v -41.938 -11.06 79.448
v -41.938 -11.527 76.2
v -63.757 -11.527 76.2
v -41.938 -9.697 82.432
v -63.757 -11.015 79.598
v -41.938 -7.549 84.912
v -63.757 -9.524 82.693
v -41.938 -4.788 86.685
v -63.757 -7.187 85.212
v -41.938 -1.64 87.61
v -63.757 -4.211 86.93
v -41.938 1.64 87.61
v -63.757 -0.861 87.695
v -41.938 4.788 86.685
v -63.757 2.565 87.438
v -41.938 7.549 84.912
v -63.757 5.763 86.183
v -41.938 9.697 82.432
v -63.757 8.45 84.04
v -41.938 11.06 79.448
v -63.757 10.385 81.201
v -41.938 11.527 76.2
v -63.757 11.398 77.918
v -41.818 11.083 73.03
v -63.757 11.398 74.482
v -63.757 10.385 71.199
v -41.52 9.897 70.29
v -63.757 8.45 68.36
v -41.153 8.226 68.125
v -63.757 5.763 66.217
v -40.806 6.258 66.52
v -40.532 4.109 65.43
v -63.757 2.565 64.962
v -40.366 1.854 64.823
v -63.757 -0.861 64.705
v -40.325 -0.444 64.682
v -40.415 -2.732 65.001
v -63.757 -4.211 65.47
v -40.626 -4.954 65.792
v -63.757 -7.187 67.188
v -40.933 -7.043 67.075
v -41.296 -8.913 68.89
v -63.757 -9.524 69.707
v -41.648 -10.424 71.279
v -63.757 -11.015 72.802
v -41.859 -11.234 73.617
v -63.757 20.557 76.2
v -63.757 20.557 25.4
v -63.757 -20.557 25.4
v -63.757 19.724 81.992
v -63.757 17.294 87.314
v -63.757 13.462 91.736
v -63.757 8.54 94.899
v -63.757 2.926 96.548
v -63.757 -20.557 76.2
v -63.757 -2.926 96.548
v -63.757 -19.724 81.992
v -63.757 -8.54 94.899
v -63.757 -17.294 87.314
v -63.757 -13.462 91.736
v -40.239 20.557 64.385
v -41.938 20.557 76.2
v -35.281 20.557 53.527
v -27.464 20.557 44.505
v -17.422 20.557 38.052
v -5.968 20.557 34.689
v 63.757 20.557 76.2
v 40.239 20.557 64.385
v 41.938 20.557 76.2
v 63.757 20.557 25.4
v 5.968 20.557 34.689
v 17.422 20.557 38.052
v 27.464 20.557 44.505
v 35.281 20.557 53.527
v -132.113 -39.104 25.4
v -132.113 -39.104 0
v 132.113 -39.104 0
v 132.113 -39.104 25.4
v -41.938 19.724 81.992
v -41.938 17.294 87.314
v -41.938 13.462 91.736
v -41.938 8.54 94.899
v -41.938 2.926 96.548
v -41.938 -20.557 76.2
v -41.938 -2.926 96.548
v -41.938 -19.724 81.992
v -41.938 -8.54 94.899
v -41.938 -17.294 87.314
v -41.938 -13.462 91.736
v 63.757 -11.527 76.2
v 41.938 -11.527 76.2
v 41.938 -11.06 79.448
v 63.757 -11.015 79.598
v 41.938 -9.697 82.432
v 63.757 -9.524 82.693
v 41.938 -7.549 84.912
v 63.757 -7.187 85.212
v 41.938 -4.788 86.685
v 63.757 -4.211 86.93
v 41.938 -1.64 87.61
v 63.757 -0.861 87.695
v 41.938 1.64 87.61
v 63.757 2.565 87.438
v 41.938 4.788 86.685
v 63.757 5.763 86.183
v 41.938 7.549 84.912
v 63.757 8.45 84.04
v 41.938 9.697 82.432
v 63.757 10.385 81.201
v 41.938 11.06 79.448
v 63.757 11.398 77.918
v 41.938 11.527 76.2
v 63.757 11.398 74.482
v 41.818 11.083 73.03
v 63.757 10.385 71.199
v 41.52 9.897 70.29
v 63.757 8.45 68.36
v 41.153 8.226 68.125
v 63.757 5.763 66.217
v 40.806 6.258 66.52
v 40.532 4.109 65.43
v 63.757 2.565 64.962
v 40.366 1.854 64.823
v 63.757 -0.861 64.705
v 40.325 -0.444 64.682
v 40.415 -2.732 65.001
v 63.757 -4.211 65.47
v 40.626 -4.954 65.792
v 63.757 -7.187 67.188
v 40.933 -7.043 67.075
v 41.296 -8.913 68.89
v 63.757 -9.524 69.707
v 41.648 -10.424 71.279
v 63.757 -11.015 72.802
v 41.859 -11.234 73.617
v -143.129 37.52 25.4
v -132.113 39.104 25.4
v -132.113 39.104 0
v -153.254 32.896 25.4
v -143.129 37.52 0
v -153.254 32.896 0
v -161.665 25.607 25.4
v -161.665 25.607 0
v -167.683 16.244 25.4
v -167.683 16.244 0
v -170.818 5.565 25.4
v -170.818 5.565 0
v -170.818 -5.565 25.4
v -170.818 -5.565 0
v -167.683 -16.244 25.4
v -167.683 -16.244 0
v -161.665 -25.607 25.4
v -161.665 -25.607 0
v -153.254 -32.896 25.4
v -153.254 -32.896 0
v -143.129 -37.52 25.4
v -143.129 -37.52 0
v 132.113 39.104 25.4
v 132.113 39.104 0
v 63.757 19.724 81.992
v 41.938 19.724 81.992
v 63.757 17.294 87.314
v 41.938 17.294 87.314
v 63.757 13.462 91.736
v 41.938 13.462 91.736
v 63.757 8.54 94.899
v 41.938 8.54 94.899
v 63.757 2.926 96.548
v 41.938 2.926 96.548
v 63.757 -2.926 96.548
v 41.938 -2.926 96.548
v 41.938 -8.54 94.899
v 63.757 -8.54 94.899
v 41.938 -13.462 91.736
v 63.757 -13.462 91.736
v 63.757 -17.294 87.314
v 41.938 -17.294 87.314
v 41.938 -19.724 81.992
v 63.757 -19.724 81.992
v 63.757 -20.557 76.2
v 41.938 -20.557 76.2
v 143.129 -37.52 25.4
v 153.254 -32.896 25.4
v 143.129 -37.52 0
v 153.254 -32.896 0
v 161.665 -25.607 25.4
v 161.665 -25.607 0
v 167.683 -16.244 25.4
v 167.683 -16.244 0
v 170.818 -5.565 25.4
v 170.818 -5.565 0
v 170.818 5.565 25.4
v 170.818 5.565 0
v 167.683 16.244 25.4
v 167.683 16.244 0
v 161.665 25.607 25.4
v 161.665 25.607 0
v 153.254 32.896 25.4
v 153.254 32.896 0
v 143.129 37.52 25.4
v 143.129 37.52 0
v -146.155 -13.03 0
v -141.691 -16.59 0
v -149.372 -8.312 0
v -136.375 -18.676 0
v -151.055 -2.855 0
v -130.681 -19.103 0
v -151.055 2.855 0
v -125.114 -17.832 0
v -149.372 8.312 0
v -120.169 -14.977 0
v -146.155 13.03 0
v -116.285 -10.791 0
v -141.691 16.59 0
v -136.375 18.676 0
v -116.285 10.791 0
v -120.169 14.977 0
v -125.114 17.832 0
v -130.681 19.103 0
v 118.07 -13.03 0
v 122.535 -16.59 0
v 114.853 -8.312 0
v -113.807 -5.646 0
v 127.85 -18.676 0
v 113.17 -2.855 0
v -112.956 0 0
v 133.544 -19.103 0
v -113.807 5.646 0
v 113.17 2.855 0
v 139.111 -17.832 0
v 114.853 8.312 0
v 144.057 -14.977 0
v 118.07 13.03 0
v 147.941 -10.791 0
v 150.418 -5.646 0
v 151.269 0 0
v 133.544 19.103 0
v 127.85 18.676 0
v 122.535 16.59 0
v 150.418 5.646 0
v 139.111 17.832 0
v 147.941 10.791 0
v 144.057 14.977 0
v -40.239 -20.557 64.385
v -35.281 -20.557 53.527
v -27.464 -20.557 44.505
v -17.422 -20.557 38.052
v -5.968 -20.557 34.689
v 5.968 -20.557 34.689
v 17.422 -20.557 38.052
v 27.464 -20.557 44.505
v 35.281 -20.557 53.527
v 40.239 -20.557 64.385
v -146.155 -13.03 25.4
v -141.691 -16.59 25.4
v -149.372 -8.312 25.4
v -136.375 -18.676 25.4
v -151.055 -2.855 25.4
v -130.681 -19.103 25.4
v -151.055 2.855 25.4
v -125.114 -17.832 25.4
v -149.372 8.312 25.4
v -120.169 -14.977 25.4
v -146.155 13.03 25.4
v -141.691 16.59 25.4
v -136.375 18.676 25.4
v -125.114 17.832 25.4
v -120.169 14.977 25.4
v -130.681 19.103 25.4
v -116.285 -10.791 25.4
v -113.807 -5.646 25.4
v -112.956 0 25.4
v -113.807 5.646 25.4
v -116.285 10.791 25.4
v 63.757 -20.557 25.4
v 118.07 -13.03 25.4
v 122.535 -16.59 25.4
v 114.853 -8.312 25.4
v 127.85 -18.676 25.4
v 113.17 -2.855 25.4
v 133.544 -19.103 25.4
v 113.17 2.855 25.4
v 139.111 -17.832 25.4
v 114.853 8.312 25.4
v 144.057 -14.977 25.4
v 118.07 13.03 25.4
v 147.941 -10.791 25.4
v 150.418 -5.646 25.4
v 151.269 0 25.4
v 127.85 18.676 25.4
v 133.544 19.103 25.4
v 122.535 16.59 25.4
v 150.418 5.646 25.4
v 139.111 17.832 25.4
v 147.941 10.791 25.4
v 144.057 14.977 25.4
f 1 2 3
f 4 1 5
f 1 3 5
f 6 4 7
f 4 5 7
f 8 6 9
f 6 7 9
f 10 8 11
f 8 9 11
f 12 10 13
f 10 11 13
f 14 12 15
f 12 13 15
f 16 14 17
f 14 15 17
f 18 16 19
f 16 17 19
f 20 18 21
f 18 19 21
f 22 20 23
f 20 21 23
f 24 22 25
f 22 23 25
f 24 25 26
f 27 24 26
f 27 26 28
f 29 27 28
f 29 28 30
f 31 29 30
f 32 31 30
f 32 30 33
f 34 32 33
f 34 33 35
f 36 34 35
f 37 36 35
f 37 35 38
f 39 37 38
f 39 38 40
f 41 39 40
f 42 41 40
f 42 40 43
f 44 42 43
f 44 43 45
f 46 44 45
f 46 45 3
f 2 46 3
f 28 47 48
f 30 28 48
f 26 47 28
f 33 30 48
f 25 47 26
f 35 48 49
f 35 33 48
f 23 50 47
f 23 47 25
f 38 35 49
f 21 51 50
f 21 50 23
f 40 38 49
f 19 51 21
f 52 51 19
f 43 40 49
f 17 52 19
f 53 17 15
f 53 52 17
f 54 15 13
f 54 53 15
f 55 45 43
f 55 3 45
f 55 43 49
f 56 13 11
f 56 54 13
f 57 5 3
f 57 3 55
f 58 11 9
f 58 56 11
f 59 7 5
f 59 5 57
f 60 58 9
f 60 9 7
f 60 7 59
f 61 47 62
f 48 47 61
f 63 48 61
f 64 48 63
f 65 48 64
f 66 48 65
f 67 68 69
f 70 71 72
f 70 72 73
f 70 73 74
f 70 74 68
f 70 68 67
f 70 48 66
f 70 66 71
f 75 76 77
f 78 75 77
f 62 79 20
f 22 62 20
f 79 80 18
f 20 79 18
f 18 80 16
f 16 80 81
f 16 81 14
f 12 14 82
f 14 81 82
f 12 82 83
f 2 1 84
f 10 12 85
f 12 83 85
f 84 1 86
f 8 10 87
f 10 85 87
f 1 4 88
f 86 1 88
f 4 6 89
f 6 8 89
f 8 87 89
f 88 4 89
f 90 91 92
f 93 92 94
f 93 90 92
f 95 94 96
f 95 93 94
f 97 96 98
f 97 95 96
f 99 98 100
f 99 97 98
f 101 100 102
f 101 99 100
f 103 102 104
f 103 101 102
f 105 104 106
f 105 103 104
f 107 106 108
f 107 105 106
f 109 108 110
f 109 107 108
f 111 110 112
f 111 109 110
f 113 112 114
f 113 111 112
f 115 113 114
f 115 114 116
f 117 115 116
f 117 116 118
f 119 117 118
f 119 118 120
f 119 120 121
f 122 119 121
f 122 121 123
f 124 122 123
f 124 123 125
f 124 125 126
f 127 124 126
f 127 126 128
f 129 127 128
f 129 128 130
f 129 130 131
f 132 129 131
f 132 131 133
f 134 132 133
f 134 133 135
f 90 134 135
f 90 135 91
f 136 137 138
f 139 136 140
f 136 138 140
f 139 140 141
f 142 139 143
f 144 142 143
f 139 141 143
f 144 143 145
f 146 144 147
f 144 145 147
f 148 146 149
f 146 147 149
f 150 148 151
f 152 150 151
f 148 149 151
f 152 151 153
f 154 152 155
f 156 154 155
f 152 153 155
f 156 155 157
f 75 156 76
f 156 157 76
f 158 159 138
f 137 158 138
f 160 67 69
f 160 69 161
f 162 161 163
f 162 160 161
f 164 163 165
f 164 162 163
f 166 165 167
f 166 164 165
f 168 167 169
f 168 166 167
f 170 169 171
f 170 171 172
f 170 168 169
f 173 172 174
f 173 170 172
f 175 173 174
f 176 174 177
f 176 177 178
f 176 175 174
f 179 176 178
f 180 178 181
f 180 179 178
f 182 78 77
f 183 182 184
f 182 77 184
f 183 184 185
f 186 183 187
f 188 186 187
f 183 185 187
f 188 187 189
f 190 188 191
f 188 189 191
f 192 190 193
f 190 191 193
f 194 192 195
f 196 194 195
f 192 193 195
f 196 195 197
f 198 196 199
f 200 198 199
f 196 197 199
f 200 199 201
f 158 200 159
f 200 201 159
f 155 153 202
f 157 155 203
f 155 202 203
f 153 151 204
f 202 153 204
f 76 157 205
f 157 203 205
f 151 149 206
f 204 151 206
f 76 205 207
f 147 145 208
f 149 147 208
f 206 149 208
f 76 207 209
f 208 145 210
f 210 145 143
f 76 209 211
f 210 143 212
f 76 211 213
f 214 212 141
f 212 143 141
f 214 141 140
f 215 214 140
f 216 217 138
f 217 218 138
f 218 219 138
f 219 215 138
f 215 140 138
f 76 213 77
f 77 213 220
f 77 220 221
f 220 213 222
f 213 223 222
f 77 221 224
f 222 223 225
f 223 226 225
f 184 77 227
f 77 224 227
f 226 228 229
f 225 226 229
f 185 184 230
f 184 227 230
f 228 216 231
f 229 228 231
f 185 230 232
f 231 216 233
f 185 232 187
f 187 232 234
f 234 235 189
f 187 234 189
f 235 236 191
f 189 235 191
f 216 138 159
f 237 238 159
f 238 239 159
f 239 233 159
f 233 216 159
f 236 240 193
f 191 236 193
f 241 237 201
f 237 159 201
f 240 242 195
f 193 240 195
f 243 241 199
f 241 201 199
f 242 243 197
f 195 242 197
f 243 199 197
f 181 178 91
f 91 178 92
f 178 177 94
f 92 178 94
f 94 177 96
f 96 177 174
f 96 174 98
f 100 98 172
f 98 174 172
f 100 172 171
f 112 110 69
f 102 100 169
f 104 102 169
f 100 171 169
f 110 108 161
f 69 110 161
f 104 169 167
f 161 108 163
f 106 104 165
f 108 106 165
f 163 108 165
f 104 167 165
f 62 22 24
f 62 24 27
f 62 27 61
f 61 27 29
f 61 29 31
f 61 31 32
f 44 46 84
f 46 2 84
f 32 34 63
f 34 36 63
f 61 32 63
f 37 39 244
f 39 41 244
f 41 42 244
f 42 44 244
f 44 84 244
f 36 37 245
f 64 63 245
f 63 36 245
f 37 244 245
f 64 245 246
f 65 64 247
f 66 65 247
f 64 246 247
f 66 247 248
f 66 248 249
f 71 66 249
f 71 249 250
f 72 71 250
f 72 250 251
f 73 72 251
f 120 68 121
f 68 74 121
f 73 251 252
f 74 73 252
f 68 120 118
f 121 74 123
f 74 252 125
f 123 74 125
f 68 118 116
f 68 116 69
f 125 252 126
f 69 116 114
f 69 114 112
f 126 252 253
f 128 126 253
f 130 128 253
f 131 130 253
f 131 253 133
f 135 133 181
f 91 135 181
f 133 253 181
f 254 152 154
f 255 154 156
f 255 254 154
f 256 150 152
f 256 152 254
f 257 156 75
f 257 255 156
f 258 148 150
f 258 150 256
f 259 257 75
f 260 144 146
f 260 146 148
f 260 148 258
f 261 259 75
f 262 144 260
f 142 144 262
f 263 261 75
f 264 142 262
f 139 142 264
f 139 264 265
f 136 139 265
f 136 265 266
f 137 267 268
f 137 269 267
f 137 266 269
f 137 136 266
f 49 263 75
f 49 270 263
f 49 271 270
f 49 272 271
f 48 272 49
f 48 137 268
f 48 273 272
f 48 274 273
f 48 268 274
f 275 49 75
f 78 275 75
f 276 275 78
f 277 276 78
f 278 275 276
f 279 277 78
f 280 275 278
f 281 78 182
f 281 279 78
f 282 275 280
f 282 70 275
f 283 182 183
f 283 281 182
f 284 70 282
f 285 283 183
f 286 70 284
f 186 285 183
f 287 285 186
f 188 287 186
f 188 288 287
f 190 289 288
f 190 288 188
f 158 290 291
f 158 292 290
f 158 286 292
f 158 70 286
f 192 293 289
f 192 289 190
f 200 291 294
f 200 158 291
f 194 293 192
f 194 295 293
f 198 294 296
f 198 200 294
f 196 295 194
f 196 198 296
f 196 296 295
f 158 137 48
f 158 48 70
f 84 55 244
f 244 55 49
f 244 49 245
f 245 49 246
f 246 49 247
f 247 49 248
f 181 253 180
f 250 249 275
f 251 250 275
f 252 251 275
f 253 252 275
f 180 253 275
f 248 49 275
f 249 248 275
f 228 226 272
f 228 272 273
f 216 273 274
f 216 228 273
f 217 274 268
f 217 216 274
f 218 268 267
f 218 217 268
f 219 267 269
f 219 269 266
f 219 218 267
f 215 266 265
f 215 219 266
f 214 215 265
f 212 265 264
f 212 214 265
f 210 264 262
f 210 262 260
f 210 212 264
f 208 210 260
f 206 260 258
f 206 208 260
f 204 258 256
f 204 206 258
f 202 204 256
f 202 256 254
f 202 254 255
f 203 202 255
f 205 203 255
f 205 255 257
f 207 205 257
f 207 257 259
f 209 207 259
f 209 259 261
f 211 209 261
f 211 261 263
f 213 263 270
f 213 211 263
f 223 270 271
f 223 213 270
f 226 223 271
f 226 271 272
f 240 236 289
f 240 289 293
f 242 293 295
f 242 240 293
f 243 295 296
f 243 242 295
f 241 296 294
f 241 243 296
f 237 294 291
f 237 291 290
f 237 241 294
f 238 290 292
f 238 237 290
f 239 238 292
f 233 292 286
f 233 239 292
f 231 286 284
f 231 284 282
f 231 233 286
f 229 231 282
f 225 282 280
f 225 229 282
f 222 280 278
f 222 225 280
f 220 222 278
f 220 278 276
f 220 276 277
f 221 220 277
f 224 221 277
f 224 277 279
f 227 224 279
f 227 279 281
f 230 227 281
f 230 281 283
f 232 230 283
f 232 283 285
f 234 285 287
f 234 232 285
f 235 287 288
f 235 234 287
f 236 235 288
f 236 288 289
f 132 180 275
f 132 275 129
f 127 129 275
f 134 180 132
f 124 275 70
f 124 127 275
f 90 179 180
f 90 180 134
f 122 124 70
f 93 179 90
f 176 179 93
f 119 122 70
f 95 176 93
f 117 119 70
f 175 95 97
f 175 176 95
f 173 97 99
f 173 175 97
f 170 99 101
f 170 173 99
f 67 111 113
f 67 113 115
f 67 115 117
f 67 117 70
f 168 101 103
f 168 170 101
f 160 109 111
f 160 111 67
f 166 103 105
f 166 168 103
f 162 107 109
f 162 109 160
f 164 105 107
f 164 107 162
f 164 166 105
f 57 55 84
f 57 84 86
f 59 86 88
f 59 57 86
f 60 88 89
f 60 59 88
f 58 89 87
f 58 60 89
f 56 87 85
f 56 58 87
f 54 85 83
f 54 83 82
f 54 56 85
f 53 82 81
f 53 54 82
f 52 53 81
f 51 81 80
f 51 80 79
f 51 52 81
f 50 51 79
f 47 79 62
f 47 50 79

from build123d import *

# Parameters (mm, degrees)
F0_R      = 19.1564129226
F1_DEPTH  = 25.4
F2_W      = 127.5142282248
F2_H      = 41.1144047976
F3_DEPTH  = 50.8
F5_DEPTH  = 59.6617998013
F7_DEPTH  = 21.8189658163
F8_R      = 11.5269990365
F9_DEPTH  = 234.9744529853
F11_DEPTH = 21.8189658163


with BuildPart() as f1:
    # F0 (on Top) → F1 (new body)
    with BuildSketch(Plane.XY):
        with BuildLine():
            ThreePointArc((132.1127414703, -39.1035974026), (171.2163388729, 0), (132.1127414703, 39.1035974026))
            Line((132.1127414703, 39.1035974026), (-132.1127414703, 39.1035974026))
            ThreePointArc((-132.1127414703, 39.1035974026), (-171.2163388729, 0), (-132.1127414703, -39.1035974026))
            Line((-132.1127414703, -39.1035974026), (132.1127414703, -39.1035974026))
        make_face()
        with Locations((-132.1127414703, 0)):
            Circle(F0_R, mode=Mode.SUBTRACT)
        with Locations((132.1127414703, 0)):
            Circle(F0_R, mode=Mode.SUBTRACT)
    extrude(amount=F1_DEPTH)

    # F2 (on face) → F3 (join)
    with BuildSketch(Plane.XY.offset(25.4)):
        Rectangle(F2_W, F2_H)
    extrude(amount=F3_DEPTH)

    # F4 (on face) → F5 (cut, through all)
    with BuildSketch(Plane.XZ.offset(20.5572023988)):
        with BuildLine():
            ThreePointArc((-41.9381482961, 76.2), (0, 34.2618517039), (41.9381482961, 76.2))
            Line((41.9381482961, 76.2), (-41.9381482961, 76.2))
        make_face()
    extrude(amount=-F5_DEPTH, mode=Mode.SUBTRACT)

    # F6 (on face) → F7 (join, through all)
    with BuildSketch(Plane(origin=(-63.7571141124, 0, 0), x_dir=(0, -1, 0), z_dir=(-1, 0, 0))):
        with BuildLine():
            Line((-20.5572023988, 76.2), (20.5572023988, 76.2))
            ThreePointArc((20.5572023988, 76.2), (0, 96.7572023988), (-20.5572023988, 76.2))
        make_face()
    extrude(amount=-F7_DEPTH)

    # F8 (on face) → F9 (cut, through all)
    with BuildSketch(Plane(origin=(-63.7571141124, 0, 0), x_dir=(0, -1, 0), z_dir=(-1, 0, 0))):
        with Locations((0, 76.2)):
            Circle(F8_R)
    extrude(amount=-F9_DEPTH, mode=Mode.SUBTRACT)

    # F10 (on face) → F11 (join, through all)
    with BuildSketch(Plane.YZ.offset(63.7571141124)):
        with BuildLine():
            ThreePointArc((20.5572023988, 76.2), (0, 96.7572023988), (-20.5572023988, 76.2))
            Line((-20.5572023988, 76.2), (-11.5269990365, 76.2))
            ThreePointArc((-11.5269990365, 76.2), (0, 87.7269990365), (11.5269990365, 76.2))
            Line((11.5269990365, 76.2), (20.5572023988, 76.2))
        make_face()
    extrude(amount=-F11_DEPTH)


solid = f1.part
